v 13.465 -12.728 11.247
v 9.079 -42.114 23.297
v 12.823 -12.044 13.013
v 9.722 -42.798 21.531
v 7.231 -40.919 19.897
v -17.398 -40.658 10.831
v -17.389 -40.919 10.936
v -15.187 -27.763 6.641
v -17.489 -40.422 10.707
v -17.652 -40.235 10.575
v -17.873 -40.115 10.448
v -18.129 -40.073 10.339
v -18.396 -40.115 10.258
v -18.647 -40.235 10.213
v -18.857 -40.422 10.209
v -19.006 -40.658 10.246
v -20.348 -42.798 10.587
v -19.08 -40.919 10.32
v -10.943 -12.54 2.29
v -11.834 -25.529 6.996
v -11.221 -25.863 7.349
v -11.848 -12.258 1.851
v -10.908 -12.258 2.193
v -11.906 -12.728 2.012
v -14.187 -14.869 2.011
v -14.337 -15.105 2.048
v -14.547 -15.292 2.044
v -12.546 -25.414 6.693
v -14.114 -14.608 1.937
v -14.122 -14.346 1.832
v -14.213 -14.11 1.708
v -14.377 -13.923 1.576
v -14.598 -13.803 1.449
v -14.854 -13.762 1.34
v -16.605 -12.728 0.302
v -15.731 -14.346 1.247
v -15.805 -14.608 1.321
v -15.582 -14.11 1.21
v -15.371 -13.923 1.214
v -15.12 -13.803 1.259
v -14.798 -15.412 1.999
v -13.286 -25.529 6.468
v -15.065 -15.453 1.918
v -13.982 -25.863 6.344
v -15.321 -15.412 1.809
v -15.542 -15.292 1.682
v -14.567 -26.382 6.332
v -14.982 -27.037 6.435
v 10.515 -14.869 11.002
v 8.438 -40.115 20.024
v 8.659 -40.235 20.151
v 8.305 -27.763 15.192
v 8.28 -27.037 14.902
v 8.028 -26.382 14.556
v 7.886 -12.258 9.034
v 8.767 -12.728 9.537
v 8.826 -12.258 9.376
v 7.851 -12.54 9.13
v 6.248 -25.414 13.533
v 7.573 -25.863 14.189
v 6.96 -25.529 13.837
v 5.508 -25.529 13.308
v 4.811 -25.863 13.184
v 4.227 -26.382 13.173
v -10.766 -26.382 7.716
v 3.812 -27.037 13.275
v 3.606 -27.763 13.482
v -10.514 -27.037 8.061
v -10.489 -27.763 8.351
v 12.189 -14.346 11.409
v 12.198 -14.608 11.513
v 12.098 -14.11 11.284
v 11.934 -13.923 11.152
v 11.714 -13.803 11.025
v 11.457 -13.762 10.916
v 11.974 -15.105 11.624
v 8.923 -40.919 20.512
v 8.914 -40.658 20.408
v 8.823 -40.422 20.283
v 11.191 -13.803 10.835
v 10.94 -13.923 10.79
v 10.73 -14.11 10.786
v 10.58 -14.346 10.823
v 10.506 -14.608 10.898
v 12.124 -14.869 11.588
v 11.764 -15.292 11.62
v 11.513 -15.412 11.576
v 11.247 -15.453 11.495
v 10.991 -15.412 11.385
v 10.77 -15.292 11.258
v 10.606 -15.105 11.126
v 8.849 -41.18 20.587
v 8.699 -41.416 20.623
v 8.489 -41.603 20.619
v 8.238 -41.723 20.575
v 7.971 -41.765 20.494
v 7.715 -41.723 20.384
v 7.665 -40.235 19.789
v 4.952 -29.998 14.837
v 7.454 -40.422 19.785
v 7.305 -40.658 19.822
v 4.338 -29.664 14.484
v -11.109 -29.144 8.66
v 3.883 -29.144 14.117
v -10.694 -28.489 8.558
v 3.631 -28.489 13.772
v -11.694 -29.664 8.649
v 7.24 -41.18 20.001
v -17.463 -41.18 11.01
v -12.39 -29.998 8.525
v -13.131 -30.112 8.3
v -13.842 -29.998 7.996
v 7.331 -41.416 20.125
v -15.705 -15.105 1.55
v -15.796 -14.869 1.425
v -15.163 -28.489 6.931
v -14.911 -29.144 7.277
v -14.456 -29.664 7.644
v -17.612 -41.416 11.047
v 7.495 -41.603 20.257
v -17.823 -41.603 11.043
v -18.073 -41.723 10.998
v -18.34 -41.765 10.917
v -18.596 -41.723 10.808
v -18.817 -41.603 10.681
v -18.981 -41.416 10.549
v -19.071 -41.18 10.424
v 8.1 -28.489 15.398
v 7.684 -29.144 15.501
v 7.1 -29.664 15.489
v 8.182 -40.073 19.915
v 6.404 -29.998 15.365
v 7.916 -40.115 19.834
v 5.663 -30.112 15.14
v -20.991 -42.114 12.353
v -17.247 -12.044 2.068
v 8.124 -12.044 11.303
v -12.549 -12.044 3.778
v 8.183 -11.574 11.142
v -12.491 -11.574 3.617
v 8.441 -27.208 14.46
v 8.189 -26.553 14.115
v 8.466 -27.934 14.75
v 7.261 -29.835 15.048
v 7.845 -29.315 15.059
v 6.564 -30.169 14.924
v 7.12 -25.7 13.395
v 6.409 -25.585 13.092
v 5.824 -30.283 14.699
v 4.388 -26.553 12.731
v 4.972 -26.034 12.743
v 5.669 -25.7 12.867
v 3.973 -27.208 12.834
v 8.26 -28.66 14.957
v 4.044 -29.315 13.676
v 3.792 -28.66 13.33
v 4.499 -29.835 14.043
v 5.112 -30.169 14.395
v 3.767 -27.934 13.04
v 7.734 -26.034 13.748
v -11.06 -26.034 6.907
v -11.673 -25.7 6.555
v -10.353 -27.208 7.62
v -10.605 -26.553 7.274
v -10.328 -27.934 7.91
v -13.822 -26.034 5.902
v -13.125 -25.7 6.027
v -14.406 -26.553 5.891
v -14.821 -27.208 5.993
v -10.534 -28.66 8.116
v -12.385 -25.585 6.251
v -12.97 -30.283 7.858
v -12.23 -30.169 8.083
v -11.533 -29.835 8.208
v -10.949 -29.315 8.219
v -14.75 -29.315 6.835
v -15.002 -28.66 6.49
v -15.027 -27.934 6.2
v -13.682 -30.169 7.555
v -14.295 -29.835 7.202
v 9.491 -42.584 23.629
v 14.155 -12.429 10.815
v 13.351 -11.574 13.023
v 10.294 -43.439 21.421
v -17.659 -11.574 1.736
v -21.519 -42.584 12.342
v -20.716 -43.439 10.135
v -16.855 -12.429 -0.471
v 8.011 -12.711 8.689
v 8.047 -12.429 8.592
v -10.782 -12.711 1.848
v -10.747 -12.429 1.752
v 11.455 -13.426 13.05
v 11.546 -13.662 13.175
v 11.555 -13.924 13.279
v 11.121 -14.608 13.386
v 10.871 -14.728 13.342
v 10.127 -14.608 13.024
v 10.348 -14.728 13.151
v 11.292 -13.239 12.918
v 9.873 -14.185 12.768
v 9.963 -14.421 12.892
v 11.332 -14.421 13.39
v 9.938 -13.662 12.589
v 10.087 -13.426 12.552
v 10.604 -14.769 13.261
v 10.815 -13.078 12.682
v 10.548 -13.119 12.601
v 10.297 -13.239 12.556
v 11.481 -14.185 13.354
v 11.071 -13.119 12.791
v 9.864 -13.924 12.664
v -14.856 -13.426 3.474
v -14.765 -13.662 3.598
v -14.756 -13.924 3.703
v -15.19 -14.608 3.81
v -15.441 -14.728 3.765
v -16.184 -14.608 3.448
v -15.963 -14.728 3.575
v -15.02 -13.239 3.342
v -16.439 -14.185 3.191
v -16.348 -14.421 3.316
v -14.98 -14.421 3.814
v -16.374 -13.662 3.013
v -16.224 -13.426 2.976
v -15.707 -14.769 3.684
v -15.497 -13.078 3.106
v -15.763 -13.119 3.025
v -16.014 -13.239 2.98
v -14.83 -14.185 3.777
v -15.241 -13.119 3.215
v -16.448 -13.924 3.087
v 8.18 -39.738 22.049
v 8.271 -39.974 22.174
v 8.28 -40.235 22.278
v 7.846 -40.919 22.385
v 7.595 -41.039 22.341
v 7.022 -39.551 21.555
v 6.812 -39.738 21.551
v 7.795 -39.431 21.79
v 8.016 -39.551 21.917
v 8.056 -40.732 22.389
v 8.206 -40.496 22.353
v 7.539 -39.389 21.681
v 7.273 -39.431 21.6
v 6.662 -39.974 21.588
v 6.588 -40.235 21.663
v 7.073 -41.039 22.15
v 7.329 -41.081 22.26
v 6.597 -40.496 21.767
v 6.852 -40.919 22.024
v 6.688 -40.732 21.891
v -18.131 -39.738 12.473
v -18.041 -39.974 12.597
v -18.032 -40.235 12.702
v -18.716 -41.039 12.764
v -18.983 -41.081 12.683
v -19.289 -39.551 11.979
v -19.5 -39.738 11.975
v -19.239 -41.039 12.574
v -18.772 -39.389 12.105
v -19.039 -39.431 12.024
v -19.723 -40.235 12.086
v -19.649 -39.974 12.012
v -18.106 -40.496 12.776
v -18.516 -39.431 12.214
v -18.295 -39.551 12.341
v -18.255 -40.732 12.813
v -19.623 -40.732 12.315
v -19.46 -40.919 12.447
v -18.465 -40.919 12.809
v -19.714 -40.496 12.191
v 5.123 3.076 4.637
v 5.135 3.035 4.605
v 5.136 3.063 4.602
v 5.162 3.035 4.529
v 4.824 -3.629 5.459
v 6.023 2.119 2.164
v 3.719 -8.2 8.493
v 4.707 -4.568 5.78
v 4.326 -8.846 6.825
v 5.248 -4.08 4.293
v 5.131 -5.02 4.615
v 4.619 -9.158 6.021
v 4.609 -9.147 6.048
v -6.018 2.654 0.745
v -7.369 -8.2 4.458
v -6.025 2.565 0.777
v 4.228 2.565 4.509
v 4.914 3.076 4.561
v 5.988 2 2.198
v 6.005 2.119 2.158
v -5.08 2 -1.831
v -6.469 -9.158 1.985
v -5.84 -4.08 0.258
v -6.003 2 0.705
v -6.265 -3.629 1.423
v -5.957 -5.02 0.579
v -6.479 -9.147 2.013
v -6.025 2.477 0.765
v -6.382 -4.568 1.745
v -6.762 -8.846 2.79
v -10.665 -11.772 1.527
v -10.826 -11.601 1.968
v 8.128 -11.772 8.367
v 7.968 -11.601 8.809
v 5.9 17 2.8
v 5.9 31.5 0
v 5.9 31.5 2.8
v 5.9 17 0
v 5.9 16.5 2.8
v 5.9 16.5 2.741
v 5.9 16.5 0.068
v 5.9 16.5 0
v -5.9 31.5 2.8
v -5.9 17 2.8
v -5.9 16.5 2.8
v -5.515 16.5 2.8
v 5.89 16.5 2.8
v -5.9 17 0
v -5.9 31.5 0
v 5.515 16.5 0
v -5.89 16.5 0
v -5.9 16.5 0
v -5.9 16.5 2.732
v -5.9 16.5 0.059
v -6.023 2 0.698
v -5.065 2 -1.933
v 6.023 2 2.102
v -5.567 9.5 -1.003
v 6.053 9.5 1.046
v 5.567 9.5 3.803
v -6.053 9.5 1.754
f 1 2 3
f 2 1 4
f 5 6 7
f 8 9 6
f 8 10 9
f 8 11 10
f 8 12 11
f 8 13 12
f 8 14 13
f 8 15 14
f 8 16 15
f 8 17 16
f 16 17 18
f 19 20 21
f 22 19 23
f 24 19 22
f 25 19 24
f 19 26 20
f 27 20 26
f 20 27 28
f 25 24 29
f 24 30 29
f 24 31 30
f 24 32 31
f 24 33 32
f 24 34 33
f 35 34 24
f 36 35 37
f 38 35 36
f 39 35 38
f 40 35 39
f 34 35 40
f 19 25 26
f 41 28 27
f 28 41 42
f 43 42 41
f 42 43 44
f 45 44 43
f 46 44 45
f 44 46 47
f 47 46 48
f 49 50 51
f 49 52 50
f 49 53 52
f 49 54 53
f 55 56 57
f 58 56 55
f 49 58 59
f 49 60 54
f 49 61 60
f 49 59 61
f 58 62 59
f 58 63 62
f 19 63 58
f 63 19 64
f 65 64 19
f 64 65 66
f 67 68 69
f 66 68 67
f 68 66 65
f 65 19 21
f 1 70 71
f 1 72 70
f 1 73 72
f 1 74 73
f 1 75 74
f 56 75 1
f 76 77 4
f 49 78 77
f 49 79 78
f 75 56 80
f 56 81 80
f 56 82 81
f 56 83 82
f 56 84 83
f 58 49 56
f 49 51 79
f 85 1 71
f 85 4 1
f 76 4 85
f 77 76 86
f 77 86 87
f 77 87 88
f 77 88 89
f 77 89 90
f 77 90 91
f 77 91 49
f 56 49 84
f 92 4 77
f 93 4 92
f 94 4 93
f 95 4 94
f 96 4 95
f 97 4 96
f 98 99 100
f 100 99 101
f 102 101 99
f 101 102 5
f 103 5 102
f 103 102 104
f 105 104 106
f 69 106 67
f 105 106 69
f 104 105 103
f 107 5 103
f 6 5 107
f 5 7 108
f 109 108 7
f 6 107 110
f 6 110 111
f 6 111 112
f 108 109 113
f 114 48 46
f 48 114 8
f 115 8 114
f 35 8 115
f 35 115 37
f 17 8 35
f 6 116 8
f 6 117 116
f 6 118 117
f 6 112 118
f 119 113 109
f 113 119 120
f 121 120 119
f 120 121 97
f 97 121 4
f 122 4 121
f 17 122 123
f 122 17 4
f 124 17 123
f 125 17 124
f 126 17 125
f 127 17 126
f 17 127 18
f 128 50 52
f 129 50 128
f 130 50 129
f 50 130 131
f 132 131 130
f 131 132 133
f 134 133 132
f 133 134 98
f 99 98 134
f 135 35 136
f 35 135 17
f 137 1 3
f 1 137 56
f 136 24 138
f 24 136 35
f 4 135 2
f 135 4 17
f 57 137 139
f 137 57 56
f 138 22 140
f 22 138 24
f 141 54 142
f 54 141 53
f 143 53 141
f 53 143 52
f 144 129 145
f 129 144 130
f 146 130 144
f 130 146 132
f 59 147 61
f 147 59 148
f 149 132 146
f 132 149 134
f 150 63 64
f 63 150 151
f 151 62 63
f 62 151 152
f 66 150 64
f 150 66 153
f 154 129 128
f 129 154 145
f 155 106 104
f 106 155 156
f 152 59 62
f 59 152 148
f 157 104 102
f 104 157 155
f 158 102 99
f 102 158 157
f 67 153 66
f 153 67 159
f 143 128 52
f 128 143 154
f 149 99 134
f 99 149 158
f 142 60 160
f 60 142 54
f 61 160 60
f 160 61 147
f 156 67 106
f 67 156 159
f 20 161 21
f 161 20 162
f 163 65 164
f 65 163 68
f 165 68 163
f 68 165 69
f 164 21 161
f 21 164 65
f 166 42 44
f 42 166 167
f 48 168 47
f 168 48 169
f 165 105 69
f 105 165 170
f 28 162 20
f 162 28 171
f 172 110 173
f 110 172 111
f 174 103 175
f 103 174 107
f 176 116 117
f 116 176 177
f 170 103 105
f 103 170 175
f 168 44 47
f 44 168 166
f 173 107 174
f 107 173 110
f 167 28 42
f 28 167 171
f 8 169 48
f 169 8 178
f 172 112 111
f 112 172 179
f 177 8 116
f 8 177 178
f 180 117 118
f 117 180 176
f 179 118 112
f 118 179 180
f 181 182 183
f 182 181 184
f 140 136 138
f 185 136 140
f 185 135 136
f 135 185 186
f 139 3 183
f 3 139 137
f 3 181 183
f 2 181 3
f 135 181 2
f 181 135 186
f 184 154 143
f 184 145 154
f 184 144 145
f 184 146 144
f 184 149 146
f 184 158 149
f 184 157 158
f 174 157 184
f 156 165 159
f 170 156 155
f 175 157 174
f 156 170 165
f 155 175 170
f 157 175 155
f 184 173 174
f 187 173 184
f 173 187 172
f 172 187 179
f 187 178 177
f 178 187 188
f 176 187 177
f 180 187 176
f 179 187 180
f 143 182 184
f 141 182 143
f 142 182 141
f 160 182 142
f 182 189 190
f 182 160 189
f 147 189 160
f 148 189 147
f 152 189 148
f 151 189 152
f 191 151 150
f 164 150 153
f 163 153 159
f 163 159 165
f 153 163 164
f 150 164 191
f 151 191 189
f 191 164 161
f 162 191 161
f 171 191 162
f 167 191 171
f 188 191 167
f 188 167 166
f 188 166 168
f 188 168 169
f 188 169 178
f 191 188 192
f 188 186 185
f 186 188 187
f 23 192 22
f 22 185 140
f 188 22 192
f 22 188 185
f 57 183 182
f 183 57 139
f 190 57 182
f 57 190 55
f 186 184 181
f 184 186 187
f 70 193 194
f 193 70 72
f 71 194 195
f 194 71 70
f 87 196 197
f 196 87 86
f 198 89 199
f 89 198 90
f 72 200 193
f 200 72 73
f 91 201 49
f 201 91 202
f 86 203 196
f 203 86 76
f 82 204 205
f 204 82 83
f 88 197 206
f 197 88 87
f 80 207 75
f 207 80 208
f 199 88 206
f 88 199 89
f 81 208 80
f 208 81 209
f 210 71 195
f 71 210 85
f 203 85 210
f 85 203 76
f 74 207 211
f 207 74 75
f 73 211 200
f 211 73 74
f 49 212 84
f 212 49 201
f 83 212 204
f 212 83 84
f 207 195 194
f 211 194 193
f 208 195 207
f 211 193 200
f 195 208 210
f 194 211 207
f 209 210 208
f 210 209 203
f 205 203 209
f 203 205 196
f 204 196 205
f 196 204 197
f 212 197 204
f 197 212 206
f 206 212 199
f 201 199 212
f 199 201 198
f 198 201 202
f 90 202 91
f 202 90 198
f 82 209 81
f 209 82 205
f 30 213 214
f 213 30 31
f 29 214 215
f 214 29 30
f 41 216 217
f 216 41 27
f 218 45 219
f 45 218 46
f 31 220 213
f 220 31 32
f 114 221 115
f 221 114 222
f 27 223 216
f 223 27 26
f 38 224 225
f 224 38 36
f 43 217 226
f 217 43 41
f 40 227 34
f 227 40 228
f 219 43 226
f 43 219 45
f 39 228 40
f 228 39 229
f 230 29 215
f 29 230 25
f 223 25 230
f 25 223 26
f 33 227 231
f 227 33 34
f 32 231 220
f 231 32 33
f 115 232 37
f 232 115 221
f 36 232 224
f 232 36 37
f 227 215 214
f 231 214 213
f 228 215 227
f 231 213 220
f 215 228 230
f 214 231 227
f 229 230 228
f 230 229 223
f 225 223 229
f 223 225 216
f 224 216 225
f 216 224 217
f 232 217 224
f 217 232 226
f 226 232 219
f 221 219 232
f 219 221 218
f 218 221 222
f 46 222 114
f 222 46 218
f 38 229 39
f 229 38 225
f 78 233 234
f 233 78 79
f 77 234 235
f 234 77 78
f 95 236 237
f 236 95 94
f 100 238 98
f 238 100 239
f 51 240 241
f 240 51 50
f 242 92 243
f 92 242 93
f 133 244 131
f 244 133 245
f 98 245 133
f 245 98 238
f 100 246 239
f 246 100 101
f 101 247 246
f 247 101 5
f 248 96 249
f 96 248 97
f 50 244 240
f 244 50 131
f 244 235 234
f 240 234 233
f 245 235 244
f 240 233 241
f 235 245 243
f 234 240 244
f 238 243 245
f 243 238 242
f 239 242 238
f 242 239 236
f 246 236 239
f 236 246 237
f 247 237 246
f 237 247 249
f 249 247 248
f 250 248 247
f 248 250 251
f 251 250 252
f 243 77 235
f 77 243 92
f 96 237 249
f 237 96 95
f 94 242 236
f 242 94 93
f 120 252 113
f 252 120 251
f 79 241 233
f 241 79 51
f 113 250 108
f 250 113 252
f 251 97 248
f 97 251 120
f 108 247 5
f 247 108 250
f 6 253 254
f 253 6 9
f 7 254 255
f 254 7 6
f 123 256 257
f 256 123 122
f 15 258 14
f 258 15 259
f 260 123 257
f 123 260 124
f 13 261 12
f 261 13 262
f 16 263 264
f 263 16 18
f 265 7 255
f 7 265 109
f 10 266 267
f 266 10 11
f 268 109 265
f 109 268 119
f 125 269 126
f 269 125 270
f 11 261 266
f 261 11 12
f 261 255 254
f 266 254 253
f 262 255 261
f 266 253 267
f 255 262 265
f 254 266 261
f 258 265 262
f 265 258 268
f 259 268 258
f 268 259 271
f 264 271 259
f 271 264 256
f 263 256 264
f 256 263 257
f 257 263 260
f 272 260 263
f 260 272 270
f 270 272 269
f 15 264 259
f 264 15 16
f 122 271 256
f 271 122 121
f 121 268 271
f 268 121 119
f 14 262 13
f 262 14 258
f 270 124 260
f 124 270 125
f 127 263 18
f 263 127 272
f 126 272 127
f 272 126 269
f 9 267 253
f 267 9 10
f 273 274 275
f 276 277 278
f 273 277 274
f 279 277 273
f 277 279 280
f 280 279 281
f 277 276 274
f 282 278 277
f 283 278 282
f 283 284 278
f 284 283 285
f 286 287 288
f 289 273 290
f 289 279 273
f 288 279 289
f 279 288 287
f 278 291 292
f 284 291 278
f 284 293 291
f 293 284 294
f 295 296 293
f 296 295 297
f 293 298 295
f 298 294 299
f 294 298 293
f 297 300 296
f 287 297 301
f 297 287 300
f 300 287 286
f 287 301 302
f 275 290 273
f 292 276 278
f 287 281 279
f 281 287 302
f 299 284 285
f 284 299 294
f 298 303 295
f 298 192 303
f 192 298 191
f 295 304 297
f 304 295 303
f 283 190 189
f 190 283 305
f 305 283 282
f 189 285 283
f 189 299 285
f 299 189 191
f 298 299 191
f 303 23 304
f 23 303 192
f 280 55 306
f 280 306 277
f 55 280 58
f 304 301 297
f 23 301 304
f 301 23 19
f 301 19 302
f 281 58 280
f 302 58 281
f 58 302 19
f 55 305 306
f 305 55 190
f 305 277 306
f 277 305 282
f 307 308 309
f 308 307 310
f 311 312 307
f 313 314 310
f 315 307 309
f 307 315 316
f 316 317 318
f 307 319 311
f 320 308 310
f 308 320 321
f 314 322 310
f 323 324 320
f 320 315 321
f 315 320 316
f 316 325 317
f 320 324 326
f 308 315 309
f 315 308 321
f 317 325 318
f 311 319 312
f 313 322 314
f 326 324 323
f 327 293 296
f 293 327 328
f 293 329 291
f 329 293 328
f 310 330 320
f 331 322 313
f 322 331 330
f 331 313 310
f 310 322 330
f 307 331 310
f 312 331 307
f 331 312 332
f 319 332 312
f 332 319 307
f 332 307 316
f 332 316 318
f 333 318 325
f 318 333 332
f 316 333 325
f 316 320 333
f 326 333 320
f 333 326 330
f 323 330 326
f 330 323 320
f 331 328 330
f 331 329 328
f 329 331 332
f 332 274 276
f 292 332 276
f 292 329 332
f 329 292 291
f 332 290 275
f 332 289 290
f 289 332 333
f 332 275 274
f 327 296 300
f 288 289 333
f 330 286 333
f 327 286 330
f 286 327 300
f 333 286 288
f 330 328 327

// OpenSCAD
$fn=20;

rotate([-20, -20, 0]) 
translate([.5, -30, 2]) 
{
    translate([14, 14, 0]) cylinder(2.5, 0.9, 0.9, center=true);
    translate([-14, 14, 0]) cylinder(2.5, 0.9, 0.9, center=true);
    translate([14, -14, 0]) cylinder(2.5, 0.9, 0.9, center=true);
    translate([-14, -14, 0]) cylinder(2.5, 0.9, 0.9, center=true);
    difference() {
        union() {
            cube([33, 33, 2.5], center=true);
        }
        union() {
            translate([0, 0, .5]) cube([32, 32, 2.5], center=true);
            translate([0, 17, .5]) cube([22, 10, 2.5], center=true);
            translate([10, 0, 0]) cylinder(10, 2.5, 2.5, center=true);
            translate([-10, 0, 0]) cylinder(10, 2.5, 2.5, center=true);
        }
    }
    color("blue") translate([0, 26, 0.1]) cube([11.8, 12, 2.8], center=true);

    color("green")
    translate([0, 16.7, -1])
    // --- hull()を使って角錐台を生成 ---
    hull() {
        // 1. 底面の図形 (Z=0の位置)
        // 非常に薄い(0.01)立方体を配置します
        translate([0, 0, 0]) {
            cube([20, 1, .5], center = true);
        }
        
        // 2. 天面の図形 (Z=heightの位置)
        // 高さを変えて、もう一つの立方体を配置します
        translate([0, 10, .45]) {
            cube([10, 1, 1.5], center = true);
        }
    }
}
color("red") translate([0, 24, 1.4]) cube([11.8, 15, 2.8], center=true);

translate([0, 17, 1.4])
rotate([90, 0, 0])
linear_extrude(15, twist=-20)
    square([11.8, 2.8], center=true);
